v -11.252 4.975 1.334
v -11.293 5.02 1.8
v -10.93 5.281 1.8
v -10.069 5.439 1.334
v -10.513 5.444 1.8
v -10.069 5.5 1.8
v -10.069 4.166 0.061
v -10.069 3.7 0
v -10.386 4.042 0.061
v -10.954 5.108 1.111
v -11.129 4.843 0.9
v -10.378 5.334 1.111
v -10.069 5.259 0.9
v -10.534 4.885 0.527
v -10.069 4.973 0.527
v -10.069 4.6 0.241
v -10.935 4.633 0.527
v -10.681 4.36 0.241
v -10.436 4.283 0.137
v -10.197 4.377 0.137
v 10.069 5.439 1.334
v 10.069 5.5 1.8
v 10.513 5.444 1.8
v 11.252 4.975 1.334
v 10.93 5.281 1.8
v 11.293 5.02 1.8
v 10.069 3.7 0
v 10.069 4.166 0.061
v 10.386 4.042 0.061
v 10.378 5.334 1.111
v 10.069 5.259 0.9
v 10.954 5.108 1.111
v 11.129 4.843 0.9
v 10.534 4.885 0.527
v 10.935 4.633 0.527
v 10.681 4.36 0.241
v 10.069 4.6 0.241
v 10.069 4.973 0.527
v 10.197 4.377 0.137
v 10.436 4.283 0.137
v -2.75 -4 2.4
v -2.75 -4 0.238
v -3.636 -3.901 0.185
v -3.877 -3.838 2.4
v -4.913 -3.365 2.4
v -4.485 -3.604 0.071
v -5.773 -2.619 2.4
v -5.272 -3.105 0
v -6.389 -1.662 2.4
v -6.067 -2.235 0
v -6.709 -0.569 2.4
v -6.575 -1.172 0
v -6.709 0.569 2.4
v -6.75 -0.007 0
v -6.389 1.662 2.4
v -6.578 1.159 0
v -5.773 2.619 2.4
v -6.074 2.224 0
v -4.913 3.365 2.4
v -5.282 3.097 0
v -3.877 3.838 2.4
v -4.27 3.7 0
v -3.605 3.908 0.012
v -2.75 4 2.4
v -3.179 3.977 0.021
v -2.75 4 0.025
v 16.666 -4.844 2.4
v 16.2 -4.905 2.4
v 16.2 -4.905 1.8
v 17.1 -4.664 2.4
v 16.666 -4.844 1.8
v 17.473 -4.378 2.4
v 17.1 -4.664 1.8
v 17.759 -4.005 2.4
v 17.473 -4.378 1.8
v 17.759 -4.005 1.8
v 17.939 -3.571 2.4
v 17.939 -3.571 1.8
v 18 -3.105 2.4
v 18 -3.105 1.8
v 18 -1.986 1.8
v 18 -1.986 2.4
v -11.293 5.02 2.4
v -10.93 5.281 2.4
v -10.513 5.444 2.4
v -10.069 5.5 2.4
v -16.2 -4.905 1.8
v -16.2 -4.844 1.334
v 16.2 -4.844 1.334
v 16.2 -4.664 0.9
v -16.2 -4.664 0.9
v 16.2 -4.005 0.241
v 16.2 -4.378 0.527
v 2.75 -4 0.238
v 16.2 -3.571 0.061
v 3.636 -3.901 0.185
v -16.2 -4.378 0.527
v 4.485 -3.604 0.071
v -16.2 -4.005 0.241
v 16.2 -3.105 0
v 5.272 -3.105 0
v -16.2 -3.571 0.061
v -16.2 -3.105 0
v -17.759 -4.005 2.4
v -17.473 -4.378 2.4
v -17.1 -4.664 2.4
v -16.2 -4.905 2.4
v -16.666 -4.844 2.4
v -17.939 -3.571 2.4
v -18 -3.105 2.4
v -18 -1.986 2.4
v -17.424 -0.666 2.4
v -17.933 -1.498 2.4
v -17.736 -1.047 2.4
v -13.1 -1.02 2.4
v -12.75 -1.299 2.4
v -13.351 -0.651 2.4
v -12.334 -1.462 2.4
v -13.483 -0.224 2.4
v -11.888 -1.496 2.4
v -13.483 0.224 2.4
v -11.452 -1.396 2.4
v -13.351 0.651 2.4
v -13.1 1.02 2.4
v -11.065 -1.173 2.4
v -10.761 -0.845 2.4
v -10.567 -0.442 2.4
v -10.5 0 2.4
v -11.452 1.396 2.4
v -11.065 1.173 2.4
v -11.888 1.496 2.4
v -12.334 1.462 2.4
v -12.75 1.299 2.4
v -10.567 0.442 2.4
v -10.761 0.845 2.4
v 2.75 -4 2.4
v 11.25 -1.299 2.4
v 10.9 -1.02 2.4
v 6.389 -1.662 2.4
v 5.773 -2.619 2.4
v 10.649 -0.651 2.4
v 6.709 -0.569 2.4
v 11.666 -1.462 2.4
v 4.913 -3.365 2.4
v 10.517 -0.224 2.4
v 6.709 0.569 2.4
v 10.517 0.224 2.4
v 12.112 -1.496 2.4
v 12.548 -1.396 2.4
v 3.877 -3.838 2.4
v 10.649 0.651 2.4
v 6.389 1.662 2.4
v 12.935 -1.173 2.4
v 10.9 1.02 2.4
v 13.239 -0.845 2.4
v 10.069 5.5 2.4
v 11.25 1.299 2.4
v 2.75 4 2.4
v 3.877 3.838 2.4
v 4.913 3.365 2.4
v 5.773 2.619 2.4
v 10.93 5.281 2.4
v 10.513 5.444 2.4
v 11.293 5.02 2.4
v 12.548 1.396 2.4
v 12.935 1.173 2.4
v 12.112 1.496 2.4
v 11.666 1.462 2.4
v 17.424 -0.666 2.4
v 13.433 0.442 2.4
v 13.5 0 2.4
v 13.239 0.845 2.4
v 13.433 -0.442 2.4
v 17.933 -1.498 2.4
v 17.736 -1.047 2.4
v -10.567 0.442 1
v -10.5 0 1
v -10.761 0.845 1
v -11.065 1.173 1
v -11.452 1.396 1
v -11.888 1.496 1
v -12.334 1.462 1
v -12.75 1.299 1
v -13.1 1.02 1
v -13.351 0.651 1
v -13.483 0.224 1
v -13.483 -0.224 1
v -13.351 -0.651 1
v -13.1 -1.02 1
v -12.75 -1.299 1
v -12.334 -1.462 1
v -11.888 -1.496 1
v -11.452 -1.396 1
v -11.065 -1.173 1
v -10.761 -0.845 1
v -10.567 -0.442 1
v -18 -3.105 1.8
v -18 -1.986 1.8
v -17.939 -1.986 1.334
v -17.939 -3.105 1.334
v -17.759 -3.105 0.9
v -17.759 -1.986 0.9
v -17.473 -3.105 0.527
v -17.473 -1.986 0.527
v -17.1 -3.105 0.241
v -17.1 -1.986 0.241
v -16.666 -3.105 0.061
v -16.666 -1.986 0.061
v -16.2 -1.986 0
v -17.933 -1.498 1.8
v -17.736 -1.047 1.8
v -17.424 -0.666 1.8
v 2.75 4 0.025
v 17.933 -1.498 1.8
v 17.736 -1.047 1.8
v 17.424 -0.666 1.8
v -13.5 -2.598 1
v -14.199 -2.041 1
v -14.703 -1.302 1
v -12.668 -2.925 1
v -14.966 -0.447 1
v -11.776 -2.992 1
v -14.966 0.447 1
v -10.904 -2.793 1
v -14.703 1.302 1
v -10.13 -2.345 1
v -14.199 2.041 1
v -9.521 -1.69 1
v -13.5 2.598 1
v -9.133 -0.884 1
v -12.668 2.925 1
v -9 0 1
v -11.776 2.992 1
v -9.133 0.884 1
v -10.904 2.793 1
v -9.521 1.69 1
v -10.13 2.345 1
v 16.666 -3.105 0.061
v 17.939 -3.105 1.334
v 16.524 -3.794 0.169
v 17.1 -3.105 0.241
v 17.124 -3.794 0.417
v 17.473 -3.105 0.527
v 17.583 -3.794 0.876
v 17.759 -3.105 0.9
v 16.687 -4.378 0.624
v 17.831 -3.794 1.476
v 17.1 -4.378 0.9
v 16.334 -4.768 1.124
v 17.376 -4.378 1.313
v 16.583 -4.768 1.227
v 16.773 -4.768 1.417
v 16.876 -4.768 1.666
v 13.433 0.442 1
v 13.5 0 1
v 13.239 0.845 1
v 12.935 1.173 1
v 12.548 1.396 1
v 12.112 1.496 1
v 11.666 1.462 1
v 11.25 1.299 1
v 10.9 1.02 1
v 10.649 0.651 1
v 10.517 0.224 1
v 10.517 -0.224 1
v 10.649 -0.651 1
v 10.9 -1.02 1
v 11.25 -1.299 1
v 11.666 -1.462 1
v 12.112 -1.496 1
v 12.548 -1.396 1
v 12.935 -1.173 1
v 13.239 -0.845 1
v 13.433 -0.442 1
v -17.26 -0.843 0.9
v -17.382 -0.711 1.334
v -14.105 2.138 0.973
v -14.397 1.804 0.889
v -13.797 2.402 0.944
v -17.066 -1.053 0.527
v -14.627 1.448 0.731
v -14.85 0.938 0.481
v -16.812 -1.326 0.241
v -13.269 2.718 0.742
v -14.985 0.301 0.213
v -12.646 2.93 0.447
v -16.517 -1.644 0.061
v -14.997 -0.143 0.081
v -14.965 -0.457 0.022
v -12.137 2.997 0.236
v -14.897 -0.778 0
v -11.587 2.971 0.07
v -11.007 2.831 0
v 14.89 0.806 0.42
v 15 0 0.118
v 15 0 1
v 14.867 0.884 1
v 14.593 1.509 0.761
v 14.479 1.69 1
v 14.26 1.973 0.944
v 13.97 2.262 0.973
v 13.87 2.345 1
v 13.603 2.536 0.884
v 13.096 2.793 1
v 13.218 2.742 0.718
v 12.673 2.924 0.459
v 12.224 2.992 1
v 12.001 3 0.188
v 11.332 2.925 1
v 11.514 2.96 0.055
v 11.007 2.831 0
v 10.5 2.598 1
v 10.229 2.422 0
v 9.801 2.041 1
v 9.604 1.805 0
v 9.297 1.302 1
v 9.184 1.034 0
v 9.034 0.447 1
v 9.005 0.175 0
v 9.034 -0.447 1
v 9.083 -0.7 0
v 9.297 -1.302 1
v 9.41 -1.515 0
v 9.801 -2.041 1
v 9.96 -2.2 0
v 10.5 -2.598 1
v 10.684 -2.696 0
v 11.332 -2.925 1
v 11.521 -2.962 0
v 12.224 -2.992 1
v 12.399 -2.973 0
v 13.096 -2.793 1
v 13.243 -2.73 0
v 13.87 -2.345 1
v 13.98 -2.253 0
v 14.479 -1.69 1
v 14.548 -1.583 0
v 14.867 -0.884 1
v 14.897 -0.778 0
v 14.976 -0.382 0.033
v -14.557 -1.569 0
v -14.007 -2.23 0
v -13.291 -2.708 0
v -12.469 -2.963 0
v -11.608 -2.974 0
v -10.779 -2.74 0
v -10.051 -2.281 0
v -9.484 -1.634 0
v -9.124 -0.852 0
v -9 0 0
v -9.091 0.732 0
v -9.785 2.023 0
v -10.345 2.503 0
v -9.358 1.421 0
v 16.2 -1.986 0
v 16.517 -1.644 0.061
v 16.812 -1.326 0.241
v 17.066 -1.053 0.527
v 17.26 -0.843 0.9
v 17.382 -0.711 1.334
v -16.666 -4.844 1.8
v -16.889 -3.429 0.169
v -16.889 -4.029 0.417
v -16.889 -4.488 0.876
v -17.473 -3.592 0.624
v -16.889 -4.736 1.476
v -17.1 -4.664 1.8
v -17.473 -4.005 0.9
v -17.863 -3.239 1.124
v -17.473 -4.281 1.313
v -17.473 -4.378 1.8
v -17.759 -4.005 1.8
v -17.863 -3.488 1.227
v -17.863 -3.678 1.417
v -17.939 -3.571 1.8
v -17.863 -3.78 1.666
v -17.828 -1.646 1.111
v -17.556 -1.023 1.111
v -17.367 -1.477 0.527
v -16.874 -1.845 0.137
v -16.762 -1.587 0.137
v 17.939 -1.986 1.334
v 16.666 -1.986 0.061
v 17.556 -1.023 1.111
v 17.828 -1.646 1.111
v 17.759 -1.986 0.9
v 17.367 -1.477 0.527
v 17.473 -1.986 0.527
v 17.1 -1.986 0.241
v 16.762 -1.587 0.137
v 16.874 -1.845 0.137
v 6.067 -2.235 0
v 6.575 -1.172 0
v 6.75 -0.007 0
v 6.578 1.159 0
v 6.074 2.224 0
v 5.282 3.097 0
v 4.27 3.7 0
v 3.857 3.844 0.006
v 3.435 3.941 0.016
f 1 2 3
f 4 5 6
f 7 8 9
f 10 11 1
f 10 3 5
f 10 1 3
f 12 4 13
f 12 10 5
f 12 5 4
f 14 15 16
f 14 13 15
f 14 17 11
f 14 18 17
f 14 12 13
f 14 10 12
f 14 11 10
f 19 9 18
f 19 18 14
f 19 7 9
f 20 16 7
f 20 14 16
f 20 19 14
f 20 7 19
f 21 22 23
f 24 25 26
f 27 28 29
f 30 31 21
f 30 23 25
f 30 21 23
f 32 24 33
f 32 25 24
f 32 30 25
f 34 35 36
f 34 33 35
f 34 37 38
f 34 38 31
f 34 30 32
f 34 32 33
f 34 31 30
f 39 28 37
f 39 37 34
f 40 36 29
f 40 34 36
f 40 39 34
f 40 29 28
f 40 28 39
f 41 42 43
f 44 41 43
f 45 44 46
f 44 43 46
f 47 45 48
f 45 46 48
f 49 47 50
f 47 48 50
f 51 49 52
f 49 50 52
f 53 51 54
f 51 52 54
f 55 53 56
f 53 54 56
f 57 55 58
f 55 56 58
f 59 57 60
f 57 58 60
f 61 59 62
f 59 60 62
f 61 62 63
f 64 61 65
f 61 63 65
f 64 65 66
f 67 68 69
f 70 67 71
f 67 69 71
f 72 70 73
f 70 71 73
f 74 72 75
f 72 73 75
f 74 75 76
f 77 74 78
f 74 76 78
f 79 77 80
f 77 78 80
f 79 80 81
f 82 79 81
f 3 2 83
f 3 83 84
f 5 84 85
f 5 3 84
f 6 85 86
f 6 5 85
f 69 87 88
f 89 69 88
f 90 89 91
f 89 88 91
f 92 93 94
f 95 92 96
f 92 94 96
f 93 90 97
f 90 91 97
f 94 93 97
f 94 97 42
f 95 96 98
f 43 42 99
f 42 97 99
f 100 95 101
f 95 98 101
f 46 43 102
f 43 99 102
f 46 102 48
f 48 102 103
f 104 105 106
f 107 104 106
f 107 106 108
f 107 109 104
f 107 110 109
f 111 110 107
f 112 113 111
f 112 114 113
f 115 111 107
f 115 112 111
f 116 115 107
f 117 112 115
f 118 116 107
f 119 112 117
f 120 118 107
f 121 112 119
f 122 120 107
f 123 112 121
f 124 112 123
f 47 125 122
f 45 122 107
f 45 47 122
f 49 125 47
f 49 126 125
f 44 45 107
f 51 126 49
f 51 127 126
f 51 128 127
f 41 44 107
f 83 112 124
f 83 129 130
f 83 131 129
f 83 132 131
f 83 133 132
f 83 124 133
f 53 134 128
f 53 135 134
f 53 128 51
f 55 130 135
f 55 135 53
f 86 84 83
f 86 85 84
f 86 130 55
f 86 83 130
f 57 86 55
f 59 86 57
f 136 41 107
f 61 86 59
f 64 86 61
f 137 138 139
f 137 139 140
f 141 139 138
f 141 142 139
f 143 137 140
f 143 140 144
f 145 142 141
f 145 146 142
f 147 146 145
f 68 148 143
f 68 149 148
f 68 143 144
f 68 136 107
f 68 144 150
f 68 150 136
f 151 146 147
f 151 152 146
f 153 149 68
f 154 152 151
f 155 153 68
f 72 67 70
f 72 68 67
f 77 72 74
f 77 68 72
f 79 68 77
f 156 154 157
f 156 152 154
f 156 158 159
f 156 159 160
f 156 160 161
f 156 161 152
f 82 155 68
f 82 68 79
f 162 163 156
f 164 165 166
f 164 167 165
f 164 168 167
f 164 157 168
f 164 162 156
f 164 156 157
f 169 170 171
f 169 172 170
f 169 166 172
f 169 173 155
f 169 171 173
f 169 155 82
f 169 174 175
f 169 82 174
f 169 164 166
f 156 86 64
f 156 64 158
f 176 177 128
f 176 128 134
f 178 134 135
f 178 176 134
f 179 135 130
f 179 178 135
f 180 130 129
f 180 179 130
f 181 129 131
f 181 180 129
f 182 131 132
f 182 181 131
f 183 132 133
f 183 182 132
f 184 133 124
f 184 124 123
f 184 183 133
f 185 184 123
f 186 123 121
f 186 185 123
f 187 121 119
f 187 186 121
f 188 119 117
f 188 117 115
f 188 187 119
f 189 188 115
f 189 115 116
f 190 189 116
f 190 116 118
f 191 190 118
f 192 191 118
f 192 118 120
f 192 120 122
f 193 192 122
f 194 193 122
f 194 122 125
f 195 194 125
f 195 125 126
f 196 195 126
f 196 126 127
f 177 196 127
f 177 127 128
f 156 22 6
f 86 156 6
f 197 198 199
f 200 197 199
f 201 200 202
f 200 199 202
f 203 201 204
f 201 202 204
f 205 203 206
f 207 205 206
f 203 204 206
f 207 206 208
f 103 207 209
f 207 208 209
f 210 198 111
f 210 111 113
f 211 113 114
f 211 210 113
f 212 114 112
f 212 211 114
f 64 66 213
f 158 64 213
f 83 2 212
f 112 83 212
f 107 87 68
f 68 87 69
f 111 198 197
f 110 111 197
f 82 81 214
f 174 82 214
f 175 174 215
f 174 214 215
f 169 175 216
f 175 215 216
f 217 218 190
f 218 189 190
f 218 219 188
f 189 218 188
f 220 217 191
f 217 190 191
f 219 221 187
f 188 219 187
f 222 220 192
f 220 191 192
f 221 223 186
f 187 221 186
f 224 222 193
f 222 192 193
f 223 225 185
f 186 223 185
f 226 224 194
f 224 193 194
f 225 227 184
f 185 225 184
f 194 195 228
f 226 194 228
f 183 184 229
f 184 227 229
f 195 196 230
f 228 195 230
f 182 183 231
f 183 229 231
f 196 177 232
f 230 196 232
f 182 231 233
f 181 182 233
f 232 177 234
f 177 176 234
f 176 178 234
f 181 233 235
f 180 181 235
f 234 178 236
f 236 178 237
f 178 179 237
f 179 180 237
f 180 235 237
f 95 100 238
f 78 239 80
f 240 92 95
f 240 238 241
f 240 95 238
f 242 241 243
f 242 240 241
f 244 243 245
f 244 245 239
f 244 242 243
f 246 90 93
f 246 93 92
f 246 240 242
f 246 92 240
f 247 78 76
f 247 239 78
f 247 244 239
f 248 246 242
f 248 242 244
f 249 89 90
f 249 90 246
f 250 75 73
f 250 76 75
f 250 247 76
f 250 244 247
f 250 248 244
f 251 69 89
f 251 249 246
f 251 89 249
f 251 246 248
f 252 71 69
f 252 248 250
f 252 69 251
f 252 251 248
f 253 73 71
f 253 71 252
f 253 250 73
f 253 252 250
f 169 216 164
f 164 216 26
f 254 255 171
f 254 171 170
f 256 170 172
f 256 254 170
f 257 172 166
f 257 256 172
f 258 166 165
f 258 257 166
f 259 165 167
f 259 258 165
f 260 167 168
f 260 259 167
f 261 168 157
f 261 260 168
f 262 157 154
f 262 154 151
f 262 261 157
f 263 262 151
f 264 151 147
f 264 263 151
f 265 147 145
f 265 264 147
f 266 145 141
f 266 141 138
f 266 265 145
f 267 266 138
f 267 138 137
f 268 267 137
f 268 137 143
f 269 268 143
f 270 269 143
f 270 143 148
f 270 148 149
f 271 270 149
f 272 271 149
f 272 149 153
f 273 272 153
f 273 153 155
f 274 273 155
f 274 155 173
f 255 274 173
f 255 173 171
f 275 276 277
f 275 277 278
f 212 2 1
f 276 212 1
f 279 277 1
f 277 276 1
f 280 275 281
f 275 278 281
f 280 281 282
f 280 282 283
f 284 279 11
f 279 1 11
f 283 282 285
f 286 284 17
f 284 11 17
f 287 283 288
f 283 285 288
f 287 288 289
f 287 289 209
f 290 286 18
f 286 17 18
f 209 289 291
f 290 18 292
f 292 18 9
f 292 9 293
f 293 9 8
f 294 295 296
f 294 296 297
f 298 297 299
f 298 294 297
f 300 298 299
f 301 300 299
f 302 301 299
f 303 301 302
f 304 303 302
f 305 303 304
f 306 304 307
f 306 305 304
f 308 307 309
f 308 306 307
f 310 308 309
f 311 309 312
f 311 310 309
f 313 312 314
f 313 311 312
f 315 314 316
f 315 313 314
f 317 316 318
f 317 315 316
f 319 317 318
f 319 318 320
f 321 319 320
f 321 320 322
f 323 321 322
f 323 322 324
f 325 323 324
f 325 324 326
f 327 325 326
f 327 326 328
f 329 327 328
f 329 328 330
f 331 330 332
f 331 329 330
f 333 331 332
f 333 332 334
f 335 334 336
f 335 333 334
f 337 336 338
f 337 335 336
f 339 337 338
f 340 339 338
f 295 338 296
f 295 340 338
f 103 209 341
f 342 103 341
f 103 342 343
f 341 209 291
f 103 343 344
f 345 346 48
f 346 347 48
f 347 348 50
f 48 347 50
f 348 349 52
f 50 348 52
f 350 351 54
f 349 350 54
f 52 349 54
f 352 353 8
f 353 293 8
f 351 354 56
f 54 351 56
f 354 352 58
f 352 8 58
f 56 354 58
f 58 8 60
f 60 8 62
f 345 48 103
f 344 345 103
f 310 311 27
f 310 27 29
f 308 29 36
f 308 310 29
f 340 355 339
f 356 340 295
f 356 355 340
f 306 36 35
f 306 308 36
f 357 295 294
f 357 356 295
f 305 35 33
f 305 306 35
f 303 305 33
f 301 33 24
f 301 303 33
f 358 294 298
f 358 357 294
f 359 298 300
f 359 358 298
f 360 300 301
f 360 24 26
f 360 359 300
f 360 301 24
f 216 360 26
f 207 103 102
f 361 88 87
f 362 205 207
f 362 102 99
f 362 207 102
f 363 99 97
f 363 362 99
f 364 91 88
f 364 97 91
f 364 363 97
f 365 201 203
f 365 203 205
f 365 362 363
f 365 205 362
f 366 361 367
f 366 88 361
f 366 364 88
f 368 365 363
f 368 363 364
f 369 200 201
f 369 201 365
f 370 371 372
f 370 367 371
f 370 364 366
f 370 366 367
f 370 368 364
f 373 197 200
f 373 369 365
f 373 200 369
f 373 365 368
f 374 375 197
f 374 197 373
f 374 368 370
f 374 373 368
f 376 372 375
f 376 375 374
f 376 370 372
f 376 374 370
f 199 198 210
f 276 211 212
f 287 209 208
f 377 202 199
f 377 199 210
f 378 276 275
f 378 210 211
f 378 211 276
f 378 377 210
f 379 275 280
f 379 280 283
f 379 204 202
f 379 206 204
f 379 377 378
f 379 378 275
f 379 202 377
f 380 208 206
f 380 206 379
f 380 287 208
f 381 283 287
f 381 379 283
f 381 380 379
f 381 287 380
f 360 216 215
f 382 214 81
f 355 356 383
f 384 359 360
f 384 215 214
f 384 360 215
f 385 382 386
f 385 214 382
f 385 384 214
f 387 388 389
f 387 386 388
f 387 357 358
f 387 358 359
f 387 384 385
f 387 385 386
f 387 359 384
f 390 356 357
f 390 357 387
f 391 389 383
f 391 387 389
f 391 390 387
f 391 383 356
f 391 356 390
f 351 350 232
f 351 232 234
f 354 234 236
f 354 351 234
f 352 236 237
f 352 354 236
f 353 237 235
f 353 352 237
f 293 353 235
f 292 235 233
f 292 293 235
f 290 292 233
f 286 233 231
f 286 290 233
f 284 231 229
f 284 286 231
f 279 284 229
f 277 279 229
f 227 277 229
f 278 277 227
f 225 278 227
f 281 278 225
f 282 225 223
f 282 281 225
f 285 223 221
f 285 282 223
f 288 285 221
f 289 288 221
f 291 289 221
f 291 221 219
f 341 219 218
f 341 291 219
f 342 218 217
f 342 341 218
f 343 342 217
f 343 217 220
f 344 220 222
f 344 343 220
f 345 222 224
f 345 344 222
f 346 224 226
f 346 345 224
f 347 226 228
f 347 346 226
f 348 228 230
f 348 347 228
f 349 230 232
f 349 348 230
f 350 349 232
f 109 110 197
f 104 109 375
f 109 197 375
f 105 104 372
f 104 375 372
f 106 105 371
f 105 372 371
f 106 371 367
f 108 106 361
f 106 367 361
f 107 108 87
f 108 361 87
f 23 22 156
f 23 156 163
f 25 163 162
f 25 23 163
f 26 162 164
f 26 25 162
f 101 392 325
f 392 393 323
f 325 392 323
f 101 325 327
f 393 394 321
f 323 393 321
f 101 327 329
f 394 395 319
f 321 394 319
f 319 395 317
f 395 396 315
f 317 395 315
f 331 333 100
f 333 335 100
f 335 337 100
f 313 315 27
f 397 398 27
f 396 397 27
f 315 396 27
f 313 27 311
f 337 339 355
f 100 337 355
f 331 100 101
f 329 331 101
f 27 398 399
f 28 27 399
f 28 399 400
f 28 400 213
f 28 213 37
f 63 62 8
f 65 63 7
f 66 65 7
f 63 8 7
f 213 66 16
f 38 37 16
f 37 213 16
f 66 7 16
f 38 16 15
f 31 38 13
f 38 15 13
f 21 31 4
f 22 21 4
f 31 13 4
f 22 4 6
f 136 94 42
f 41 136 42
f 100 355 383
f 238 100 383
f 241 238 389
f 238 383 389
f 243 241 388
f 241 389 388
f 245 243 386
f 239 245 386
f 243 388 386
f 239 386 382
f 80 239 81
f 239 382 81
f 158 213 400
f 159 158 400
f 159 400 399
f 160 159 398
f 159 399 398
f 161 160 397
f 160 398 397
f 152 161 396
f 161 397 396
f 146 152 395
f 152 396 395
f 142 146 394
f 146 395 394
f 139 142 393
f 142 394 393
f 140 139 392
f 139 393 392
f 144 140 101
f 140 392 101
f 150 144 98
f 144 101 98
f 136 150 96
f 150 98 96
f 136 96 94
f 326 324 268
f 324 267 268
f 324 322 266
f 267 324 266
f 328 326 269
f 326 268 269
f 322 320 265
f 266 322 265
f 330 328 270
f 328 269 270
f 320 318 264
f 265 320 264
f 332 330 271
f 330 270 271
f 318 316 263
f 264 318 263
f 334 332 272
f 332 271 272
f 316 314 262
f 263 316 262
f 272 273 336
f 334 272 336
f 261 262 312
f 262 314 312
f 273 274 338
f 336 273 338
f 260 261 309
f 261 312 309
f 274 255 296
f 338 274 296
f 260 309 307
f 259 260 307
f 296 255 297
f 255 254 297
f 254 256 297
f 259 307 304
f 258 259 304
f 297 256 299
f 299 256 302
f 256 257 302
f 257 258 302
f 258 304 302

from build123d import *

# Parameters (mm, degrees)
F0_R         = 3
F0_R_2       = 1.5
F1_DEPTH     = 2.4
F2_DEPTH     = 1
F3_T1_DEPTH  = 1.1190522621
F3_T3_DEPTH  = 32.4
F3_T5_DEPTH  = 20.138628613
F3_T7_DEPTH  = 2.365520331
F3_T9_DEPTH  = 8.3614446785
F3_T11_DEPTH = 8.3614446785
F3_T13_DEPTH = 5.1
F3_T15_DEPTH = 2.5639483811
F3_T20_DEPTH = 1.8
F3_S25_W     = 1.8
F3_S25_H     = 1.8
F3_T26_DEPTH = 1.8
F3_S31_W     = 1.8
F3_S31_H     = 1.8
F3_T32_DEPTH = 1.8
F3_T38_DEPTH = 1.8
F3_T44_DEPTH = 1.8
F3_T50_DEPTH = 1.8


# Not quite as in the source:
# - a fillet or chamfer that OpenCascade refuses, or shapes differently, is made with other operations: its cross-section is extruded or revolved along the edge and cut away or added


with BuildPart() as f1:
    # F0 (on Top) → F1 (new body)
    with BuildSketch(Plane.XY):
        Polygon((-18, -1.2002319389), (-18, -4.9048635534), (18, -4.9048635534), (18, -1.2002319389), (10.7755224389, 5.5), (-10.7755224389, 5.5), align=None)
        with Locations((-12, 0)):
            Circle(F0_R, mode=Mode.SUBTRACT)
        with BuildLine():
            ThreePointArc((-2.75, -4), (-6.75, 0), (-2.75, 4))
            Line((-2.75, 4), (2.75, 4))
            ThreePointArc((2.75, 4), (6.75, 0), (2.75, -4))
            Line((2.75, -4), (-2.75, -4))
        make_face(mode=Mode.SUBTRACT)
        with Locations((12, 0)):
            Circle(F0_R, mode=Mode.SUBTRACT)
        with Locations((-12, 0)):
            Circle(F0_R)
        with Locations((-12, 0)):
            Circle(F0_R_2, mode=Mode.SUBTRACT)
        with Locations((12, 0)):
            Circle(F0_R)
        with Locations((12, 0)):
            Circle(F0_R_2, mode=Mode.SUBTRACT)
    extrude(amount=F1_DEPTH)

    # F0 (on Top) → F2 (cut)
    with BuildSketch(Plane.XY):
        with Locations((12, 0)):
            Circle(F0_R)
        with Locations((12, 0)):
            Circle(F0_R_2, mode=Mode.SUBTRACT)
        with Locations((-12, 0)):
            Circle(F0_R)
        with Locations((-12, 0)):
            Circle(F0_R_2, mode=Mode.SUBTRACT)
    extrude(amount=F2_DEPTH, mode=Mode.SUBTRACT)

    # F3: fillet of radius 1.8 on 12 edges, made by hand

    # F3_s2 → F3_t1 (cut)
    with BuildSketch(Plane.XZ.offset(1.9858112913)):
        with BuildLine():
            ThreePointArc((-18, 1.8), (-17.4727922061, 0.5272077939), (-16.2, 0))
            Line((-16.2, 0), (-18, 0))
            Line((-18, 0), (-18, 1.8))
        make_face()
        with BuildLine():
            ThreePointArc((16.2, 0), (17.4727922061, 0.5272077939), (18, 1.8))
            Line((18, 1.8), (18, 0))
            Line((18, 0), (16.2, 0))
        make_face()
    extrude(amount=F3_T1_DEPTH, mode=Mode.SUBTRACT)

    # F3_s4 → F3_t3 (cut)
    with BuildSketch(Plane.YZ.offset(-16.2)):
        with BuildLine():
            ThreePointArc((-4.9048635534, 1.8), (-4.3776557595, 0.5272077939), (-3.1048635534, 0))
            Line((-3.1048635534, 0), (-4.9048635534, 0))
            Line((-4.9048635534, 0), (-4.9048635534, 1.8))
        make_face()
    extrude(amount=F3_T3_DEPTH, mode=Mode.SUBTRACT)

    # F3_s6 → F3_t5 (cut)
    with BuildSketch(Plane.YZ.offset(-10.0693143065)):
        with BuildLine():
            ThreePointArc((3.7, 0), (4.9727922061, 0.5272077939), (5.5, 1.8))
            Line((5.5, 1.8), (5.5, 0))
            Line((5.5, 0), (3.7, 0))
        make_face()
    extrude(amount=F3_T5_DEPTH, mode=Mode.SUBTRACT)

    # F3_s8 → F3_t7 (cut)
    with BuildSketch(Plane.XY.offset(1.8)):
        with BuildLine():
            ThreePointArc((10.0693143065, 5.5), (10.7267347006, 5.3756486581), (11.2933205301, 5.0197760282))
            Line((11.2933205301, 5.0197760282), (10.7755224389, 5.5))
            Line((10.7755224389, 5.5), (10.0693143065, 5.5))
        make_face()
        with BuildLine():
            ThreePointArc((-11.2933205301, 5.0197760282), (-10.7267347006, 5.3756486581), (-10.0693143065, 5.5))
            Line((-10.0693143065, 5.5), (-10.7755224389, 5.5))
            Line((-10.7755224389, 5.5), (-11.2933205301, 5.0197760282))
        make_face()
    extrude(amount=F3_T7_DEPTH, mode=Mode.SUBTRACT)

    # F3_s10 → F3_t9 (cut)
    with BuildSketch(Plane(origin=(-3.5684530391, -3.3095075488, 0), x_dir=(0, 0, 1), z_dir=(-0.7332089046, -0.6800034575, 0))):
        with BuildLine():
            ThreePointArc((1.8, 11.3600414903), (0.5272077939, 10.8328336964), (0, 9.5600414903))
            Line((0, 9.5600414903), (0, 11.3600414903))
            Line((0, 11.3600414903), (1.8, 11.3600414903))
        make_face()
    extrude(amount=F3_T9_DEPTH, mode=Mode.SUBTRACT)

    # F3_s12 → F3_t11 (cut)
    with BuildSketch(Plane(origin=(9.6991387326, -8.9953188401, 0), x_dir=(0, 0, 1), z_dir=(-0.7332089046, 0.6800034575, 0))):
        with BuildLine():
            ThreePointArc((0, 9.5600414903), (0.5272077939, 10.8328336964), (1.8, 11.3600414903))
            Line((1.8, 11.3600414903), (0, 11.3600414903))
            Line((0, 11.3600414903), (0, 9.5600414903))
        make_face()
    extrude(amount=F3_T11_DEPTH, mode=Mode.SUBTRACT)

    # F3_s14 → F3_t13 (cut)
    with BuildSketch(Plane.XY.offset(1.8)):
        with BuildLine():
            ThreePointArc((-18, -3.1048635534), (-17.4727922061, -4.3776557595), (-16.2, -4.9048635534))
            Line((-16.2, -4.9048635534), (-18, -4.9048635534))
            Line((-18, -4.9048635534), (-18, -3.1048635534))
        make_face()
        with BuildLine():
            ThreePointArc((16.2, -4.9048635534), (17.4727922061, -4.3776557595), (18, -3.1048635534))
            Line((18, -3.1048635534), (18, -4.9048635534))
            Line((18, -4.9048635534), (16.2, -4.9048635534))
        make_face()
    extrude(amount=F3_T13_DEPTH, mode=Mode.SUBTRACT)

    # F3_s16 → F3_t15 (cut)
    with BuildSketch(Plane.XY.offset(1.8)):
        with BuildLine():
            ThreePointArc((-18, -1.9858112913), (-17.8497289478, -1.265815181), (-17.4240062235, -0.666035263))
            Line((-17.4240062235, -0.666035263), (-18, -1.2002319389))
            Line((-18, -1.2002319389), (-18, -1.9858112913))
        make_face()
        with BuildLine():
            ThreePointArc((18, -1.9858112913), (17.8497289478, -1.265815181), (17.4240062235, -0.666035263))
            Line((17.4240062235, -0.666035263), (18, -1.2002319389))
            Line((18, -1.2002319389), (18, -1.9858112913))
        make_face()
    extrude(amount=F3_T15_DEPTH, mode=Mode.SUBTRACT)


with BuildPart() as f3_tool18:
    # F3_s19 → F3_t20 (new body)
    with BuildSketch(Plane.XY.offset(1.8)):
        Polygon((-16.2, -1.9858112913), (-18, -1.9858112913), (-18, -1.2002319389), (-17.4240062235, -0.666035263), align=None)
    extrude(amount=-F3_T20_DEPTH)

    # F3_s21 → F3_t22 (revolve, cut)
    with BuildSketch(Plane(origin=(-16.2, -1.9858112913, 1.8), x_dir=(0.9165160821, -0.399997839, 0), z_dir=(0.399997839, 0.9165160821, 0))):
        with BuildLine():
            ThreePointArc((0, -1.8), (1.8, 0), (0, 1.8))
            Line((0, 1.8), (0, -1.8))
        make_face()
    revolve(axis=Axis((-16.2, -1.9858112913, 1.8), (0, 0, -1)), mode=Mode.SUBTRACT)


with BuildPart() as f1_1:
    add(f1.part)

    # F3_t17: cut F3_tool18
    add(f3_tool18.part, mode=Mode.SUBTRACT)


with BuildPart() as f3_tool24:
    # F3_s25 → F3_t26 (new body)
    with BuildSketch(Plane.YZ.offset(-16.2)):
        with Locations((-4.0048635534, 0.9)):
            Rectangle(F3_S25_W, F3_S25_H)
    extrude(amount=-F3_T26_DEPTH)

    # F3_s27 → F3_t28 (revolve, cut)
    with BuildSketch(Plane(origin=(-16.2, -3.1048635534, 1.8), x_dir=(0, 0.7071067812, 0.7071067812), z_dir=(0, -0.7071067812, 0.7071067812))):
        with BuildLine():
            ThreePointArc((0, -1.8), (1.8, 0), (0, 1.8))
            Line((0, 1.8), (0, -1.8))
        make_face()
    revolve(axis=Axis((-16.2, -3.1048635534, 1.8), (-1, 0, 0)), mode=Mode.SUBTRACT)


with BuildPart() as f1_2:
    add(f1_1.part)

    # F3_t23: cut F3_tool24
    add(f3_tool24.part, mode=Mode.SUBTRACT)


with BuildPart() as f3_tool30:
    # F3_s31 → F3_t32 (new body)
    with BuildSketch(Plane.XZ.offset(3.1048635534)):
        with Locations((17.1, 0.9)):
            Rectangle(F3_S31_W, F3_S31_H)
    extrude(amount=F3_T32_DEPTH)

    # F3_s33 → F3_t34 (revolve, cut)
    with BuildSketch(Plane(origin=(16.2, -3.1048635534, 1.8), x_dir=(-0.7071067812, 0, 0.7071067812), z_dir=(0.7071067812, 0, 0.7071067812))):
        with BuildLine():
            ThreePointArc((0, -1.8), (1.8, 0), (0, 1.8))
            Line((0, 1.8), (0, -1.8))
        make_face()
    revolve(axis=Axis((16.2, -3.1048635534, 1.8), (0, -1, 0)), mode=Mode.SUBTRACT)


with BuildPart() as f1_3:
    add(f1_2.part)

    # F3_t29: cut F3_tool30
    add(f3_tool30.part, mode=Mode.SUBTRACT)


with BuildPart() as f3_tool36:
    # F3_s37 → F3_t38 (new body)
    with BuildSketch(Plane.XY.offset(1.8)):
        Polygon((16.2, -1.9858112913), (18, -1.9858112913), (18, -1.2002319389), (17.4240062235, -0.666035263), align=None)
    extrude(amount=-F3_T38_DEPTH)

    # F3_s39 → F3_t40 (revolve, cut)
    with BuildSketch(Plane(origin=(16.2, -1.9858112913, 1.8), x_dir=(-0.9165160821, -0.399997839, 0), z_dir=(0.399997839, -0.9165160821, 0))):
        with BuildLine():
            ThreePointArc((0, -1.8), (1.8, 0), (0, 1.8))
            Line((0, 1.8), (0, -1.8))
        make_face()
    revolve(axis=Axis((16.2, -1.9858112913, 1.8), (0, 0, -1)), mode=Mode.SUBTRACT)


with BuildPart() as f1_4:
    add(f1_3.part)

    # F3_t35: cut F3_tool36
    add(f3_tool36.part, mode=Mode.SUBTRACT)


with BuildPart() as f3_tool42:
    # F3_s43 → F3_t44 (new body)
    with BuildSketch(Plane.XY.offset(1.8)):
        Polygon((10.0693143065, 3.7), (10.0693143065, 5.5), (10.7755224389, 5.5), (11.2933205301, 5.0197760282), align=None)
    extrude(amount=-F3_T44_DEPTH)

    # F3_s45 → F3_t46 (revolve, cut)
    with BuildSketch(Plane(origin=(10.0693143065, 3.7, 1.8), x_dir=(-0.3652335523, -0.9309159212, 0), z_dir=(0.9309159212, -0.3652335523, 0))):
        with BuildLine():
            ThreePointArc((0, -1.8), (1.8, 0), (0, 1.8))
            Line((0, 1.8), (0, -1.8))
        make_face()
    revolve(axis=Axis((10.0693143065, 3.7, 1.8), (0, 0, -1)), mode=Mode.SUBTRACT)


with BuildPart() as f1_5:
    add(f1_4.part)

    # F3_t41: cut F3_tool42
    add(f3_tool42.part, mode=Mode.SUBTRACT)


with BuildPart() as f3_tool48:
    # F3_s49 → F3_t50 (new body)
    with BuildSketch(Plane.XY.offset(1.8)):
        Polygon((-10.0693143065, 3.7), (-10.0693143065, 5.5), (-10.7755224389, 5.5), (-11.2933205301, 5.0197760282), align=None)
    extrude(amount=-F3_T50_DEPTH)

    # F3_s51 → F3_t52 (revolve, cut)
    with BuildSketch(Plane(origin=(-10.0693143065, 3.7, 1.8), x_dir=(0.3652335523, -0.9309159212, 0), z_dir=(0.9309159212, 0.3652335523, 0))):
        with BuildLine():
            ThreePointArc((0, -1.8), (1.8, 0), (0, 1.8))
            Line((0, 1.8), (0, -1.8))
        make_face()
    revolve(axis=Axis((-10.0693143065, 3.7, 1.8), (0, 0, -1)), mode=Mode.SUBTRACT)


with BuildPart() as f1_6:
    add(f1_5.part)

    # F3_t47: cut F3_tool48
    add(f3_tool48.part, mode=Mode.SUBTRACT)


solid = f1_6.part
